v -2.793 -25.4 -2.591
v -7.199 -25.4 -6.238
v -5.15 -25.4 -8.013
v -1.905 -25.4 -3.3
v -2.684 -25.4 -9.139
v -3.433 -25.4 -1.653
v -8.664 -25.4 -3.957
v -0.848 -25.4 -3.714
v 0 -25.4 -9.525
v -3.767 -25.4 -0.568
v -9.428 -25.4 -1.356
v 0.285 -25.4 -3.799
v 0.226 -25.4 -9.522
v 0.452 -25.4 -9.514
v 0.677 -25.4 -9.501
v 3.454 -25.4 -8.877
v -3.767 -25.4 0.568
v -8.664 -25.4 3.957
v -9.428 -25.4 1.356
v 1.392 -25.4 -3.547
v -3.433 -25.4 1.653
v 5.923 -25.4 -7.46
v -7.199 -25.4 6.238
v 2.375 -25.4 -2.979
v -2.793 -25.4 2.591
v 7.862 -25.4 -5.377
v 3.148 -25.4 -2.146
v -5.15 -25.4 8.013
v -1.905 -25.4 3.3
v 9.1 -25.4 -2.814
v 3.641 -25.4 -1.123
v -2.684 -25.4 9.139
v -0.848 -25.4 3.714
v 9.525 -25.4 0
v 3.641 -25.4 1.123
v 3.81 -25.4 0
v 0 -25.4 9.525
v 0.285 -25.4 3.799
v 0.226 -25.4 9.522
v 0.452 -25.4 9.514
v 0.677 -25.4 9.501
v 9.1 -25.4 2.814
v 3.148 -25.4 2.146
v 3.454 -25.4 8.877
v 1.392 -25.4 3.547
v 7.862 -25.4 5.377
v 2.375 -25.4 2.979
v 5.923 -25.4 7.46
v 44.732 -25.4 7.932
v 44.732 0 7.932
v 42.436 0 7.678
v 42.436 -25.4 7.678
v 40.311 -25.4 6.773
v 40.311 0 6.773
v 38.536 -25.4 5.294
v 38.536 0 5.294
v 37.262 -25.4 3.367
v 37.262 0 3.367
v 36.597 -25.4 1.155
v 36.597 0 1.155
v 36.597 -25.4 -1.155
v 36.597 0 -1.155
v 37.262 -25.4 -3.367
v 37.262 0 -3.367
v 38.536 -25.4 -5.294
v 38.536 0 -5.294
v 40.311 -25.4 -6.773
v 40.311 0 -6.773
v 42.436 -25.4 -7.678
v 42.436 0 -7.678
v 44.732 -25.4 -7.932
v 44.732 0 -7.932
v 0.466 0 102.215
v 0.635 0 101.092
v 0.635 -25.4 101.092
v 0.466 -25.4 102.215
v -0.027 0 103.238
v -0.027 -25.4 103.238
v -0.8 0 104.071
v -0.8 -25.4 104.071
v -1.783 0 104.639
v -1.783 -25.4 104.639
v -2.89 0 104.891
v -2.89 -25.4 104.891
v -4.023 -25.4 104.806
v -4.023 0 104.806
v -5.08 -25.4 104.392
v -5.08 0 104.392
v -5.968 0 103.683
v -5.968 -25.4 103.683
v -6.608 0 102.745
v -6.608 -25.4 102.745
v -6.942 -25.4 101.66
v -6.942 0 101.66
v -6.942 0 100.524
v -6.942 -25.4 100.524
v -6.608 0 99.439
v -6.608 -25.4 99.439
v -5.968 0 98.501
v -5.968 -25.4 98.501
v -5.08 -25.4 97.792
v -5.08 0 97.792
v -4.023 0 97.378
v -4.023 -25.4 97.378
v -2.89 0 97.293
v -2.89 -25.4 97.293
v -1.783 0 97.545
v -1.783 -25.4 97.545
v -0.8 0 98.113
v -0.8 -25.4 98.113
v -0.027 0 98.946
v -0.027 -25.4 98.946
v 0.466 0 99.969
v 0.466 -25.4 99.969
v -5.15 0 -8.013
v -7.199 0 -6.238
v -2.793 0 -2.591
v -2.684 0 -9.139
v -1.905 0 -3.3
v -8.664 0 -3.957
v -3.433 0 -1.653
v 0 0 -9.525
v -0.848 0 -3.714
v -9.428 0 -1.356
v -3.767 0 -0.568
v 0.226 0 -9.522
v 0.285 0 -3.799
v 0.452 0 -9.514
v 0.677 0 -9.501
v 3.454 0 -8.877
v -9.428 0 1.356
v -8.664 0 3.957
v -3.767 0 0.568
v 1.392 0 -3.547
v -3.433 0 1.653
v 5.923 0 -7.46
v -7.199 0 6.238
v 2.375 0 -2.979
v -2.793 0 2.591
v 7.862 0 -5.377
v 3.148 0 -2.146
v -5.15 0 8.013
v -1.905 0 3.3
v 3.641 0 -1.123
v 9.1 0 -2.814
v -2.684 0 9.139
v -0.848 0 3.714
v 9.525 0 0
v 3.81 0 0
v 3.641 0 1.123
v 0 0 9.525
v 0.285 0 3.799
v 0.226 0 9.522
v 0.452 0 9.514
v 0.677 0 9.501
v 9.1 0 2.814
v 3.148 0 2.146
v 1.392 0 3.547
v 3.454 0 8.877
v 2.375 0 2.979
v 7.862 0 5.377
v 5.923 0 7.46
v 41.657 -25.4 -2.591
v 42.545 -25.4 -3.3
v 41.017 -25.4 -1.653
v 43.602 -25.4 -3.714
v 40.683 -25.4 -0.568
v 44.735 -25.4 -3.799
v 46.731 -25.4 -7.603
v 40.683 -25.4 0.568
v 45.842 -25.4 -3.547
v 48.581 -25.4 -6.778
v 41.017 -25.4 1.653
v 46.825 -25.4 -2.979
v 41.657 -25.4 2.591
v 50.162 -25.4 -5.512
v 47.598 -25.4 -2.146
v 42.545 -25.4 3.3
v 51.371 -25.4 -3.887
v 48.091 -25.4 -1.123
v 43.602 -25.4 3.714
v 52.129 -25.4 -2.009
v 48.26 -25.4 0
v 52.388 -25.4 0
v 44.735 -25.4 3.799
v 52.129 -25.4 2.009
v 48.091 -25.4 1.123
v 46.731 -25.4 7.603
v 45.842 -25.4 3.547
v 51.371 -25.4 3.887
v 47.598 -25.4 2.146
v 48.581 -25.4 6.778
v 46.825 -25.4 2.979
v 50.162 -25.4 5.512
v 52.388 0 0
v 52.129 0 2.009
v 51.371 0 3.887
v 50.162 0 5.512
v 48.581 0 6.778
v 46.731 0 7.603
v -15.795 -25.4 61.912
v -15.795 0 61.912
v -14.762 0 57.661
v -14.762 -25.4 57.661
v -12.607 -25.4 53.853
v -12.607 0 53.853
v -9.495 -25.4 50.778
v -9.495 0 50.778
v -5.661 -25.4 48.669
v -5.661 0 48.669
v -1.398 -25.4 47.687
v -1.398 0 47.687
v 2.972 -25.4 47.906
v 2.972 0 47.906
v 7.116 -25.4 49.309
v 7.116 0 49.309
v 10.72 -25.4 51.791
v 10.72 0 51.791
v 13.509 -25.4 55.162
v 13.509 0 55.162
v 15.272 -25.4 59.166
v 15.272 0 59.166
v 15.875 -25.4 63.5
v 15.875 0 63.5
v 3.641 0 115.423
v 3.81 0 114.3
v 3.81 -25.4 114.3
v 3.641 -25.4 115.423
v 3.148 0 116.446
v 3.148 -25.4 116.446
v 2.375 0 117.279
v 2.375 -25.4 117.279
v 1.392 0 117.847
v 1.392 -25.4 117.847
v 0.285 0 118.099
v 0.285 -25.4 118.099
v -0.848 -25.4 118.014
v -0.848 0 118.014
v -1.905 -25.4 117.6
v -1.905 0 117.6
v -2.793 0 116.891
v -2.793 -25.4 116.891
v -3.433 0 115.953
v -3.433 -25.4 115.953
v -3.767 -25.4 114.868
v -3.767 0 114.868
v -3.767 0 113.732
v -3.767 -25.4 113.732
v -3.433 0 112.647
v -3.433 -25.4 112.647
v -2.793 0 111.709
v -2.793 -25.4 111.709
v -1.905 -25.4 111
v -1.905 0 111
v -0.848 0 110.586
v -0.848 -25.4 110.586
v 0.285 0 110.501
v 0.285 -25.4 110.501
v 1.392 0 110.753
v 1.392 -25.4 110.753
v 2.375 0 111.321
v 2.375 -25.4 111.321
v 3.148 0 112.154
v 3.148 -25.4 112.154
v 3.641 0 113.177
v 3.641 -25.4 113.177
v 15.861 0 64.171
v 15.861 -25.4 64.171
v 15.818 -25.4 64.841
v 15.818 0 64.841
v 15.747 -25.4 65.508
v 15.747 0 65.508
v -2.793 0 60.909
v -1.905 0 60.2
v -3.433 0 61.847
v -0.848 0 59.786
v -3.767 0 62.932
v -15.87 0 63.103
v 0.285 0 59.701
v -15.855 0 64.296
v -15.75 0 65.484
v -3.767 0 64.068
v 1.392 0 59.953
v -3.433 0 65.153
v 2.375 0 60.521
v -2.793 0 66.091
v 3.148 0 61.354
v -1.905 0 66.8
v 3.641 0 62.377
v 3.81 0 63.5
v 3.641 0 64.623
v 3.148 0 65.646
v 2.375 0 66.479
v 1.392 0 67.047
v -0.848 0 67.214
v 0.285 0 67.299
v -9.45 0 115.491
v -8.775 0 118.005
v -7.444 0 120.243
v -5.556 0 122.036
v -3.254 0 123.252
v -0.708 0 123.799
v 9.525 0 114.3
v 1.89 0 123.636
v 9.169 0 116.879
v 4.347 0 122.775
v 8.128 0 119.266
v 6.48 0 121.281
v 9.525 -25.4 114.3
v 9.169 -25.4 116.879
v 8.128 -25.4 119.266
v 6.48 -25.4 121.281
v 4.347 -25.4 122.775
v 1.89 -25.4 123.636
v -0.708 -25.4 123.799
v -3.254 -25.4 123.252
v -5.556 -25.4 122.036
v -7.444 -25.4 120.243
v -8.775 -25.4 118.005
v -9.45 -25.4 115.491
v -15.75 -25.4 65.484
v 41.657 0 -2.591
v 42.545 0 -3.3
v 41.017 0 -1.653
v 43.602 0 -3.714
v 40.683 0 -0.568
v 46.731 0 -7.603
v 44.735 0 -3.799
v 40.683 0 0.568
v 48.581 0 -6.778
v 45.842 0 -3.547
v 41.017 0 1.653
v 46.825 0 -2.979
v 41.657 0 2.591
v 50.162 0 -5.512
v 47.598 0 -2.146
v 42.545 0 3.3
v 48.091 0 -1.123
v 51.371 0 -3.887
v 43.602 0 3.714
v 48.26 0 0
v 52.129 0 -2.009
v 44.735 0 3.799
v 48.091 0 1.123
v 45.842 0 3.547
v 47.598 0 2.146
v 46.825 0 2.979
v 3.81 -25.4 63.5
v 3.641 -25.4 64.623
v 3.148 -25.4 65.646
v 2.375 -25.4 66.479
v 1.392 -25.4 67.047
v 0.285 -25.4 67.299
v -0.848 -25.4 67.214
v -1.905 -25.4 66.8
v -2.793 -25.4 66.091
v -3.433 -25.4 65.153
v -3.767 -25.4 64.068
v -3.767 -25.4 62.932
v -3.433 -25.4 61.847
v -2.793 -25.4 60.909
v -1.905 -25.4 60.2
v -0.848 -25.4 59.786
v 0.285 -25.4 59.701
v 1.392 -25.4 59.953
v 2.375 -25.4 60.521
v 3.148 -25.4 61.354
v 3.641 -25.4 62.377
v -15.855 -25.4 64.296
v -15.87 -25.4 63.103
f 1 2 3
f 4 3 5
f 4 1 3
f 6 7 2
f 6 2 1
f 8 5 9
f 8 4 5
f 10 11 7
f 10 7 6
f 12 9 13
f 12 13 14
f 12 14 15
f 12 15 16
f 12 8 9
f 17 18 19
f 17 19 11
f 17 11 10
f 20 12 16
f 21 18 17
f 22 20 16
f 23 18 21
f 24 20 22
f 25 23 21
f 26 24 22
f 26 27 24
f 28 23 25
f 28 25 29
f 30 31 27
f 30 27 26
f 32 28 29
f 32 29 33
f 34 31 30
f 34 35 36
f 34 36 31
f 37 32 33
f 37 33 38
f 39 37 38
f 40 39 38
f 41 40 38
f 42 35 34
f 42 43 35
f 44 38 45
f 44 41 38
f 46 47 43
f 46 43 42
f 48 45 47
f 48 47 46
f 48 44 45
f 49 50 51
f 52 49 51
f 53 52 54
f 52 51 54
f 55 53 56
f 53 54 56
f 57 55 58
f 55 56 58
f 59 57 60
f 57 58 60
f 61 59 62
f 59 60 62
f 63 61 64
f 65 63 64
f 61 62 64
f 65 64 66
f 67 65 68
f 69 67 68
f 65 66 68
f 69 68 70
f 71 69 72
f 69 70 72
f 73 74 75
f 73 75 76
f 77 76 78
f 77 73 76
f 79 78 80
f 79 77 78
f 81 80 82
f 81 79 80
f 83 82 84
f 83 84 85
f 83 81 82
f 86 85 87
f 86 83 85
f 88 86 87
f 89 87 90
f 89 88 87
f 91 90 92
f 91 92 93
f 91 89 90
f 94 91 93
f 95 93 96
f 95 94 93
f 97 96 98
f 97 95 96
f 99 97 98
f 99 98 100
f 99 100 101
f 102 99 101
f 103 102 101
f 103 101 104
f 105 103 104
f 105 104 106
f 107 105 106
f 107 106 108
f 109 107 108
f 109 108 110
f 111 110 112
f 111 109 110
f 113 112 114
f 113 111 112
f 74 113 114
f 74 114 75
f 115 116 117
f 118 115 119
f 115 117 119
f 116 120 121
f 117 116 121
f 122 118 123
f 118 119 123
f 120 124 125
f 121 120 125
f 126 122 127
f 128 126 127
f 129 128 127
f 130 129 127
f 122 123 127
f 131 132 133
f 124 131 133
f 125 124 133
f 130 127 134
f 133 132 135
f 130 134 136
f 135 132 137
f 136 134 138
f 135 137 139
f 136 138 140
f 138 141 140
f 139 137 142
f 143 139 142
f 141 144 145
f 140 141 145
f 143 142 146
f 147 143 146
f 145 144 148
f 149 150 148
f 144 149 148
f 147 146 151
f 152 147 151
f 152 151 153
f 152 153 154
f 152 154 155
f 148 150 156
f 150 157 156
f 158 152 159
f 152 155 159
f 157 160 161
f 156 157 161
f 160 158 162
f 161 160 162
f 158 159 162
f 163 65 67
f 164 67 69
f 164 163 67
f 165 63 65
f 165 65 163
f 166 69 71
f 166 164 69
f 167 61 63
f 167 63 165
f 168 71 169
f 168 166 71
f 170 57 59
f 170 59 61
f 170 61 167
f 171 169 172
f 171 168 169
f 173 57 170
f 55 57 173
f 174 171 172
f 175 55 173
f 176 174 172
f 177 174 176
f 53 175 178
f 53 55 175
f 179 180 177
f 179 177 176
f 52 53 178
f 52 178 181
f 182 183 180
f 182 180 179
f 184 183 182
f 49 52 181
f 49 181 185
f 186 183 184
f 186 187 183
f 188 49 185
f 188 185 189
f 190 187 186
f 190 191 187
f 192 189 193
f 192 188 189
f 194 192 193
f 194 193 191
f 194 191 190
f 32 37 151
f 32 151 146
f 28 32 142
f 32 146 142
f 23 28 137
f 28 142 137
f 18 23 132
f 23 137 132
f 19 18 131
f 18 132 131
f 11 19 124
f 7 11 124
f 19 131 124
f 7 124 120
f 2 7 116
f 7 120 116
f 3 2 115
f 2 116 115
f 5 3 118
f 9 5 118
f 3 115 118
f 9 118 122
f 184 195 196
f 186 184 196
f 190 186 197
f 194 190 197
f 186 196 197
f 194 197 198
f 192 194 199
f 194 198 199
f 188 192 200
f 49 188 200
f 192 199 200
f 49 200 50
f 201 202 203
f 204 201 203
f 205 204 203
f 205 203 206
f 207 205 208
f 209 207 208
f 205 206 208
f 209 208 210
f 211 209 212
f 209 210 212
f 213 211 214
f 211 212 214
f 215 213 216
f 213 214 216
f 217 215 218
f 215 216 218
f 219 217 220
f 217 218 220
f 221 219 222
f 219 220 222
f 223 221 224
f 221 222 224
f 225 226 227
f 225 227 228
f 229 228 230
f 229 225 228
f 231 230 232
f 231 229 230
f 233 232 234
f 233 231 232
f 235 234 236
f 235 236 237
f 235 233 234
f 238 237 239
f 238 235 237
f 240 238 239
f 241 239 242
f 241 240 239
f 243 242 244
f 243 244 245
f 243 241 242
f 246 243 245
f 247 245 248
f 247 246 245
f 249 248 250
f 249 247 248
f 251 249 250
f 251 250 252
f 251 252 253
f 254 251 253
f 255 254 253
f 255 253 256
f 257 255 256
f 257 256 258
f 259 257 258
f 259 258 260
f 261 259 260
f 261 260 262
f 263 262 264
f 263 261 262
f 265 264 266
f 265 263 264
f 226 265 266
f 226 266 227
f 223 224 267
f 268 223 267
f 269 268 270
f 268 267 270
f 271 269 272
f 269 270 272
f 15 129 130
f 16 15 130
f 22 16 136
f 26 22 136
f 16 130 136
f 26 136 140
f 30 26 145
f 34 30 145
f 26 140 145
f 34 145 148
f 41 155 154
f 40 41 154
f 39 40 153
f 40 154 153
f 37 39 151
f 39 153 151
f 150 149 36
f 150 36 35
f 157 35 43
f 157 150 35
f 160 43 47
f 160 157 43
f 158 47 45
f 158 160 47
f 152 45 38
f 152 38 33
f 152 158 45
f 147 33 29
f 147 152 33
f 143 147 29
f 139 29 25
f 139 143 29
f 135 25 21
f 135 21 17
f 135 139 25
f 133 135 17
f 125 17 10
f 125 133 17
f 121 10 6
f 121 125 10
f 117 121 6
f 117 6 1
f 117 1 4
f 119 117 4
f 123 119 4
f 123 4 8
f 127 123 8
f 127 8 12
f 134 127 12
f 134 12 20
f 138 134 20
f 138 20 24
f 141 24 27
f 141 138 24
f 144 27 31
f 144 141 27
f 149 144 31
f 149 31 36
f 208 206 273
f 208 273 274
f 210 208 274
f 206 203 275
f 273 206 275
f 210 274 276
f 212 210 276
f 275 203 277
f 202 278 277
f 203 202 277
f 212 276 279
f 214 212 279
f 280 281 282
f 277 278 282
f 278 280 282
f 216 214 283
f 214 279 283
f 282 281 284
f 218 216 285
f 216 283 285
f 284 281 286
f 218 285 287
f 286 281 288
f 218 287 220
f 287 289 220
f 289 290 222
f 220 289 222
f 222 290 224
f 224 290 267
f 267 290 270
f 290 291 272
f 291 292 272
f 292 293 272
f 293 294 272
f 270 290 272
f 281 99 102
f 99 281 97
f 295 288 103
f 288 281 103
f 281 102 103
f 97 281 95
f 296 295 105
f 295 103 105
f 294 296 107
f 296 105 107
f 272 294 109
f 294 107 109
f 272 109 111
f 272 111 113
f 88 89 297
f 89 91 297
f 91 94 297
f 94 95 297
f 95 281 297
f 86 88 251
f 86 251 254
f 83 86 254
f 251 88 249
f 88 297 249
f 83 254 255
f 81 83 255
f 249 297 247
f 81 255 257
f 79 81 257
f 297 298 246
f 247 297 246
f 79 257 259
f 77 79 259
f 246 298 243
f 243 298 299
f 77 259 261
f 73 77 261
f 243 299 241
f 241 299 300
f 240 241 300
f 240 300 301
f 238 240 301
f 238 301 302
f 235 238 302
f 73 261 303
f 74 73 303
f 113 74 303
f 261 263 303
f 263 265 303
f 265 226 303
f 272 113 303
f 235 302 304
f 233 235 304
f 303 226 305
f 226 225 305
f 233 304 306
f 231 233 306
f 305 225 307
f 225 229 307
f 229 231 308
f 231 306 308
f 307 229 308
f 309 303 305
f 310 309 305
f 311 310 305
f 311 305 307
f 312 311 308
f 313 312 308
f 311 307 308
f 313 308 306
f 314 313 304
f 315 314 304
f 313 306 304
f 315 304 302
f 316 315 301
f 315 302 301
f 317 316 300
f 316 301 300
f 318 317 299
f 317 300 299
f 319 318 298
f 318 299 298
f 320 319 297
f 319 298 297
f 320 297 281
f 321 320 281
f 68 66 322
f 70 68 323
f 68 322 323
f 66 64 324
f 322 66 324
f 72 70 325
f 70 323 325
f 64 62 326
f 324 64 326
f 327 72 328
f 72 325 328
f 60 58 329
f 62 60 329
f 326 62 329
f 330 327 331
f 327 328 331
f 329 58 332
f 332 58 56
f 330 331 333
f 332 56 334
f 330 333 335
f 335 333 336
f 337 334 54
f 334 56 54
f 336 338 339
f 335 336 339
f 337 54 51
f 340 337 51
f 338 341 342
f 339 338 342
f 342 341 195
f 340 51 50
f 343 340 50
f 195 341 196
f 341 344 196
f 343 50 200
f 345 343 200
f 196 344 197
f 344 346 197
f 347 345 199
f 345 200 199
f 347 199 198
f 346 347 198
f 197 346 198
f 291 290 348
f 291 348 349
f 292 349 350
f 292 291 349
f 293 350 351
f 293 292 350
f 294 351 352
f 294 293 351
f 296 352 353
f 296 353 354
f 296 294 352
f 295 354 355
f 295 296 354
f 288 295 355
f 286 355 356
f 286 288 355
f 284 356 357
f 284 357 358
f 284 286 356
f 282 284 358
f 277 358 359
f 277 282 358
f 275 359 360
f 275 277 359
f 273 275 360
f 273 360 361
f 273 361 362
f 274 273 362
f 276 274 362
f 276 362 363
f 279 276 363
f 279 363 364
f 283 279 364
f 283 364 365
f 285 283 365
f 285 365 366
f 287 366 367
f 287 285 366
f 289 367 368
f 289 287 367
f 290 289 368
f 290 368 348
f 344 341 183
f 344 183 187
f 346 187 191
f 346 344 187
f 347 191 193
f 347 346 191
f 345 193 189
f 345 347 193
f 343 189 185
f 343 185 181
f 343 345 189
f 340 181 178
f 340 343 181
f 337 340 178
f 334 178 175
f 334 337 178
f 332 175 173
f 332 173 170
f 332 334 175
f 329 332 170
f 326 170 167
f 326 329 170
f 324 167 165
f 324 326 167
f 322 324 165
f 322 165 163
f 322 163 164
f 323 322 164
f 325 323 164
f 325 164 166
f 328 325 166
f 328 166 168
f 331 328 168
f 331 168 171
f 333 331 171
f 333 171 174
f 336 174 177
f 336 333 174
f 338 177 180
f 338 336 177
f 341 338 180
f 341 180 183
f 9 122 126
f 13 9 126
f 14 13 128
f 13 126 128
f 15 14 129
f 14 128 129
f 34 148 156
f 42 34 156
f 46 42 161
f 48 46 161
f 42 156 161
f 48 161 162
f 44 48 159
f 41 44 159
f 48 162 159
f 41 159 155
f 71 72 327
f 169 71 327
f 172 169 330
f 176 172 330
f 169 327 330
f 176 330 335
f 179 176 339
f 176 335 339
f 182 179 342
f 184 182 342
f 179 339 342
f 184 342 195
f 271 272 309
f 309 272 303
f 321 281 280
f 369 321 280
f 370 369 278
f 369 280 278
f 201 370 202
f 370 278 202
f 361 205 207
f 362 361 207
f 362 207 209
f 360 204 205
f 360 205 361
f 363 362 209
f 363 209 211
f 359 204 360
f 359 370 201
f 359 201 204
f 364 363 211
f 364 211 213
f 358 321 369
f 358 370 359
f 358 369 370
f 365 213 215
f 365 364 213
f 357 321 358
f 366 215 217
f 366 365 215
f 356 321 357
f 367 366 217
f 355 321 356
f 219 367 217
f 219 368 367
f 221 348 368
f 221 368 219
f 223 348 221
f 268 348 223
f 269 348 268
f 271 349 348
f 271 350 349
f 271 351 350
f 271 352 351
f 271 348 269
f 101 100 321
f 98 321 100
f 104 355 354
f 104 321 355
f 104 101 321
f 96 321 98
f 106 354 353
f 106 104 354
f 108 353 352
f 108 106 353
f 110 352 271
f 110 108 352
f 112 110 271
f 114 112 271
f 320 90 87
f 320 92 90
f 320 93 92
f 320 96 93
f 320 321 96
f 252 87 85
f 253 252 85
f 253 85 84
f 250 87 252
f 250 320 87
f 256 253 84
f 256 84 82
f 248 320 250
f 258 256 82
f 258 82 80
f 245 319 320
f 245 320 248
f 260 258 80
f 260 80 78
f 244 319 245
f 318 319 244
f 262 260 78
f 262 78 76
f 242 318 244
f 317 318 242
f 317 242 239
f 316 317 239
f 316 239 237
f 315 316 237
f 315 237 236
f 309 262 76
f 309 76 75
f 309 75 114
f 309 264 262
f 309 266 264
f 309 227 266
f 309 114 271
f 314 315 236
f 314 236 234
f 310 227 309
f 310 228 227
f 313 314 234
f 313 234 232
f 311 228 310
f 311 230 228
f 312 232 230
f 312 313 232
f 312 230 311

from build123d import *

# Parameters (mm, degrees)
F0_R     = 3.81
F1_DEPTH = 25.4


with BuildPart() as f1:
    # F0 (on Front) → F1 (new body)
    with BuildSketch(Plane.XZ):
        with BuildLine():
            ThreePointArc((-9.450293, 115.490625), (-0.596483, 104.793695), (9.525, 114.3))
            ThreePointArc((9.525, 114.3), (0.596483, 123.806305), (-9.450293, 115.490625))
        make_face()
        with Locations((0, 114.3)):
            Circle(F0_R, mode=Mode.SUBTRACT)
        with BuildLine():
            Line((15.747457, 65.508289), (9.525, 114.3))
            ThreePointArc((9.525, 114.3), (-0.596483, 104.793695), (-9.450293, 115.490625))
            Line((-9.450293, 115.490625), (-15.750488, 65.484375))
            ThreePointArc((-15.750488, 65.484375), (-0.012053, 79.374995), (15.747457, 65.508289))
        make_face()
        with Locations((-3.175, 101.092)):
            Circle(F0_R, mode=Mode.SUBTRACT)
        with BuildLine():
            ThreePointArc((15.875, 63.5), (15.843082, 64.506168), (15.747457, 65.508289))
            ThreePointArc((15.747457, 65.508289), (-0.012053, 79.374995), (-15.750488, 65.484375))
            ThreePointArc((-15.750488, 65.484375), (-15.873744, 63.699705), (-15.795426, 61.9125))
            ThreePointArc((-15.795426, 61.9125), (0.794747, 47.644906), (15.875, 63.5))
        make_face()
        with Locations((0, 63.5)):
            Circle(F0_R, mode=Mode.SUBTRACT)
        with BuildLine():
            ThreePointArc((44.732405, -7.932475), (50.161633, -5.51191), (52.3875, 0))
            ThreePointArc((52.3875, 0), (50.161633, 5.51191), (44.732405, 7.932475))
            ThreePointArc((44.732405, 7.932475), (36.5125, 0), (44.732405, -7.932475))
        make_face()
        with Locations((44.45, 0)):
            Circle(F0_R, mode=Mode.SUBTRACT)
        with BuildLine():
            ThreePointArc((0, -9.525), (0.338886, -9.51897), (0.677344, -9.500886))
            Line((0.677344, -9.500886), (0, -9.525))
        make_face()
        with BuildLine():
            Line((0, -9.525), (0.677344, -9.500886))
            ThreePointArc((0.677344, -9.500886), (6.970557, -6.491299), (9.525, 0))
            ThreePointArc((9.525, 0), (6.970557, 6.491299), (0.677344, 9.500886))
            Line((0.677344, 9.500886), (0, 9.525))
            ThreePointArc((0, 9.525), (-9.525, 0), (0, -9.525))
        make_face()
        Circle(F0_R, mode=Mode.SUBTRACT)
        with BuildLine():
            ThreePointArc((0.677344, 9.500886), (0.338886, 9.51897), (0, 9.525))
            Line((0, 9.525), (0.677344, 9.500886))
        make_face()
    extrude(amount=F1_DEPTH)


solid = f1.part
